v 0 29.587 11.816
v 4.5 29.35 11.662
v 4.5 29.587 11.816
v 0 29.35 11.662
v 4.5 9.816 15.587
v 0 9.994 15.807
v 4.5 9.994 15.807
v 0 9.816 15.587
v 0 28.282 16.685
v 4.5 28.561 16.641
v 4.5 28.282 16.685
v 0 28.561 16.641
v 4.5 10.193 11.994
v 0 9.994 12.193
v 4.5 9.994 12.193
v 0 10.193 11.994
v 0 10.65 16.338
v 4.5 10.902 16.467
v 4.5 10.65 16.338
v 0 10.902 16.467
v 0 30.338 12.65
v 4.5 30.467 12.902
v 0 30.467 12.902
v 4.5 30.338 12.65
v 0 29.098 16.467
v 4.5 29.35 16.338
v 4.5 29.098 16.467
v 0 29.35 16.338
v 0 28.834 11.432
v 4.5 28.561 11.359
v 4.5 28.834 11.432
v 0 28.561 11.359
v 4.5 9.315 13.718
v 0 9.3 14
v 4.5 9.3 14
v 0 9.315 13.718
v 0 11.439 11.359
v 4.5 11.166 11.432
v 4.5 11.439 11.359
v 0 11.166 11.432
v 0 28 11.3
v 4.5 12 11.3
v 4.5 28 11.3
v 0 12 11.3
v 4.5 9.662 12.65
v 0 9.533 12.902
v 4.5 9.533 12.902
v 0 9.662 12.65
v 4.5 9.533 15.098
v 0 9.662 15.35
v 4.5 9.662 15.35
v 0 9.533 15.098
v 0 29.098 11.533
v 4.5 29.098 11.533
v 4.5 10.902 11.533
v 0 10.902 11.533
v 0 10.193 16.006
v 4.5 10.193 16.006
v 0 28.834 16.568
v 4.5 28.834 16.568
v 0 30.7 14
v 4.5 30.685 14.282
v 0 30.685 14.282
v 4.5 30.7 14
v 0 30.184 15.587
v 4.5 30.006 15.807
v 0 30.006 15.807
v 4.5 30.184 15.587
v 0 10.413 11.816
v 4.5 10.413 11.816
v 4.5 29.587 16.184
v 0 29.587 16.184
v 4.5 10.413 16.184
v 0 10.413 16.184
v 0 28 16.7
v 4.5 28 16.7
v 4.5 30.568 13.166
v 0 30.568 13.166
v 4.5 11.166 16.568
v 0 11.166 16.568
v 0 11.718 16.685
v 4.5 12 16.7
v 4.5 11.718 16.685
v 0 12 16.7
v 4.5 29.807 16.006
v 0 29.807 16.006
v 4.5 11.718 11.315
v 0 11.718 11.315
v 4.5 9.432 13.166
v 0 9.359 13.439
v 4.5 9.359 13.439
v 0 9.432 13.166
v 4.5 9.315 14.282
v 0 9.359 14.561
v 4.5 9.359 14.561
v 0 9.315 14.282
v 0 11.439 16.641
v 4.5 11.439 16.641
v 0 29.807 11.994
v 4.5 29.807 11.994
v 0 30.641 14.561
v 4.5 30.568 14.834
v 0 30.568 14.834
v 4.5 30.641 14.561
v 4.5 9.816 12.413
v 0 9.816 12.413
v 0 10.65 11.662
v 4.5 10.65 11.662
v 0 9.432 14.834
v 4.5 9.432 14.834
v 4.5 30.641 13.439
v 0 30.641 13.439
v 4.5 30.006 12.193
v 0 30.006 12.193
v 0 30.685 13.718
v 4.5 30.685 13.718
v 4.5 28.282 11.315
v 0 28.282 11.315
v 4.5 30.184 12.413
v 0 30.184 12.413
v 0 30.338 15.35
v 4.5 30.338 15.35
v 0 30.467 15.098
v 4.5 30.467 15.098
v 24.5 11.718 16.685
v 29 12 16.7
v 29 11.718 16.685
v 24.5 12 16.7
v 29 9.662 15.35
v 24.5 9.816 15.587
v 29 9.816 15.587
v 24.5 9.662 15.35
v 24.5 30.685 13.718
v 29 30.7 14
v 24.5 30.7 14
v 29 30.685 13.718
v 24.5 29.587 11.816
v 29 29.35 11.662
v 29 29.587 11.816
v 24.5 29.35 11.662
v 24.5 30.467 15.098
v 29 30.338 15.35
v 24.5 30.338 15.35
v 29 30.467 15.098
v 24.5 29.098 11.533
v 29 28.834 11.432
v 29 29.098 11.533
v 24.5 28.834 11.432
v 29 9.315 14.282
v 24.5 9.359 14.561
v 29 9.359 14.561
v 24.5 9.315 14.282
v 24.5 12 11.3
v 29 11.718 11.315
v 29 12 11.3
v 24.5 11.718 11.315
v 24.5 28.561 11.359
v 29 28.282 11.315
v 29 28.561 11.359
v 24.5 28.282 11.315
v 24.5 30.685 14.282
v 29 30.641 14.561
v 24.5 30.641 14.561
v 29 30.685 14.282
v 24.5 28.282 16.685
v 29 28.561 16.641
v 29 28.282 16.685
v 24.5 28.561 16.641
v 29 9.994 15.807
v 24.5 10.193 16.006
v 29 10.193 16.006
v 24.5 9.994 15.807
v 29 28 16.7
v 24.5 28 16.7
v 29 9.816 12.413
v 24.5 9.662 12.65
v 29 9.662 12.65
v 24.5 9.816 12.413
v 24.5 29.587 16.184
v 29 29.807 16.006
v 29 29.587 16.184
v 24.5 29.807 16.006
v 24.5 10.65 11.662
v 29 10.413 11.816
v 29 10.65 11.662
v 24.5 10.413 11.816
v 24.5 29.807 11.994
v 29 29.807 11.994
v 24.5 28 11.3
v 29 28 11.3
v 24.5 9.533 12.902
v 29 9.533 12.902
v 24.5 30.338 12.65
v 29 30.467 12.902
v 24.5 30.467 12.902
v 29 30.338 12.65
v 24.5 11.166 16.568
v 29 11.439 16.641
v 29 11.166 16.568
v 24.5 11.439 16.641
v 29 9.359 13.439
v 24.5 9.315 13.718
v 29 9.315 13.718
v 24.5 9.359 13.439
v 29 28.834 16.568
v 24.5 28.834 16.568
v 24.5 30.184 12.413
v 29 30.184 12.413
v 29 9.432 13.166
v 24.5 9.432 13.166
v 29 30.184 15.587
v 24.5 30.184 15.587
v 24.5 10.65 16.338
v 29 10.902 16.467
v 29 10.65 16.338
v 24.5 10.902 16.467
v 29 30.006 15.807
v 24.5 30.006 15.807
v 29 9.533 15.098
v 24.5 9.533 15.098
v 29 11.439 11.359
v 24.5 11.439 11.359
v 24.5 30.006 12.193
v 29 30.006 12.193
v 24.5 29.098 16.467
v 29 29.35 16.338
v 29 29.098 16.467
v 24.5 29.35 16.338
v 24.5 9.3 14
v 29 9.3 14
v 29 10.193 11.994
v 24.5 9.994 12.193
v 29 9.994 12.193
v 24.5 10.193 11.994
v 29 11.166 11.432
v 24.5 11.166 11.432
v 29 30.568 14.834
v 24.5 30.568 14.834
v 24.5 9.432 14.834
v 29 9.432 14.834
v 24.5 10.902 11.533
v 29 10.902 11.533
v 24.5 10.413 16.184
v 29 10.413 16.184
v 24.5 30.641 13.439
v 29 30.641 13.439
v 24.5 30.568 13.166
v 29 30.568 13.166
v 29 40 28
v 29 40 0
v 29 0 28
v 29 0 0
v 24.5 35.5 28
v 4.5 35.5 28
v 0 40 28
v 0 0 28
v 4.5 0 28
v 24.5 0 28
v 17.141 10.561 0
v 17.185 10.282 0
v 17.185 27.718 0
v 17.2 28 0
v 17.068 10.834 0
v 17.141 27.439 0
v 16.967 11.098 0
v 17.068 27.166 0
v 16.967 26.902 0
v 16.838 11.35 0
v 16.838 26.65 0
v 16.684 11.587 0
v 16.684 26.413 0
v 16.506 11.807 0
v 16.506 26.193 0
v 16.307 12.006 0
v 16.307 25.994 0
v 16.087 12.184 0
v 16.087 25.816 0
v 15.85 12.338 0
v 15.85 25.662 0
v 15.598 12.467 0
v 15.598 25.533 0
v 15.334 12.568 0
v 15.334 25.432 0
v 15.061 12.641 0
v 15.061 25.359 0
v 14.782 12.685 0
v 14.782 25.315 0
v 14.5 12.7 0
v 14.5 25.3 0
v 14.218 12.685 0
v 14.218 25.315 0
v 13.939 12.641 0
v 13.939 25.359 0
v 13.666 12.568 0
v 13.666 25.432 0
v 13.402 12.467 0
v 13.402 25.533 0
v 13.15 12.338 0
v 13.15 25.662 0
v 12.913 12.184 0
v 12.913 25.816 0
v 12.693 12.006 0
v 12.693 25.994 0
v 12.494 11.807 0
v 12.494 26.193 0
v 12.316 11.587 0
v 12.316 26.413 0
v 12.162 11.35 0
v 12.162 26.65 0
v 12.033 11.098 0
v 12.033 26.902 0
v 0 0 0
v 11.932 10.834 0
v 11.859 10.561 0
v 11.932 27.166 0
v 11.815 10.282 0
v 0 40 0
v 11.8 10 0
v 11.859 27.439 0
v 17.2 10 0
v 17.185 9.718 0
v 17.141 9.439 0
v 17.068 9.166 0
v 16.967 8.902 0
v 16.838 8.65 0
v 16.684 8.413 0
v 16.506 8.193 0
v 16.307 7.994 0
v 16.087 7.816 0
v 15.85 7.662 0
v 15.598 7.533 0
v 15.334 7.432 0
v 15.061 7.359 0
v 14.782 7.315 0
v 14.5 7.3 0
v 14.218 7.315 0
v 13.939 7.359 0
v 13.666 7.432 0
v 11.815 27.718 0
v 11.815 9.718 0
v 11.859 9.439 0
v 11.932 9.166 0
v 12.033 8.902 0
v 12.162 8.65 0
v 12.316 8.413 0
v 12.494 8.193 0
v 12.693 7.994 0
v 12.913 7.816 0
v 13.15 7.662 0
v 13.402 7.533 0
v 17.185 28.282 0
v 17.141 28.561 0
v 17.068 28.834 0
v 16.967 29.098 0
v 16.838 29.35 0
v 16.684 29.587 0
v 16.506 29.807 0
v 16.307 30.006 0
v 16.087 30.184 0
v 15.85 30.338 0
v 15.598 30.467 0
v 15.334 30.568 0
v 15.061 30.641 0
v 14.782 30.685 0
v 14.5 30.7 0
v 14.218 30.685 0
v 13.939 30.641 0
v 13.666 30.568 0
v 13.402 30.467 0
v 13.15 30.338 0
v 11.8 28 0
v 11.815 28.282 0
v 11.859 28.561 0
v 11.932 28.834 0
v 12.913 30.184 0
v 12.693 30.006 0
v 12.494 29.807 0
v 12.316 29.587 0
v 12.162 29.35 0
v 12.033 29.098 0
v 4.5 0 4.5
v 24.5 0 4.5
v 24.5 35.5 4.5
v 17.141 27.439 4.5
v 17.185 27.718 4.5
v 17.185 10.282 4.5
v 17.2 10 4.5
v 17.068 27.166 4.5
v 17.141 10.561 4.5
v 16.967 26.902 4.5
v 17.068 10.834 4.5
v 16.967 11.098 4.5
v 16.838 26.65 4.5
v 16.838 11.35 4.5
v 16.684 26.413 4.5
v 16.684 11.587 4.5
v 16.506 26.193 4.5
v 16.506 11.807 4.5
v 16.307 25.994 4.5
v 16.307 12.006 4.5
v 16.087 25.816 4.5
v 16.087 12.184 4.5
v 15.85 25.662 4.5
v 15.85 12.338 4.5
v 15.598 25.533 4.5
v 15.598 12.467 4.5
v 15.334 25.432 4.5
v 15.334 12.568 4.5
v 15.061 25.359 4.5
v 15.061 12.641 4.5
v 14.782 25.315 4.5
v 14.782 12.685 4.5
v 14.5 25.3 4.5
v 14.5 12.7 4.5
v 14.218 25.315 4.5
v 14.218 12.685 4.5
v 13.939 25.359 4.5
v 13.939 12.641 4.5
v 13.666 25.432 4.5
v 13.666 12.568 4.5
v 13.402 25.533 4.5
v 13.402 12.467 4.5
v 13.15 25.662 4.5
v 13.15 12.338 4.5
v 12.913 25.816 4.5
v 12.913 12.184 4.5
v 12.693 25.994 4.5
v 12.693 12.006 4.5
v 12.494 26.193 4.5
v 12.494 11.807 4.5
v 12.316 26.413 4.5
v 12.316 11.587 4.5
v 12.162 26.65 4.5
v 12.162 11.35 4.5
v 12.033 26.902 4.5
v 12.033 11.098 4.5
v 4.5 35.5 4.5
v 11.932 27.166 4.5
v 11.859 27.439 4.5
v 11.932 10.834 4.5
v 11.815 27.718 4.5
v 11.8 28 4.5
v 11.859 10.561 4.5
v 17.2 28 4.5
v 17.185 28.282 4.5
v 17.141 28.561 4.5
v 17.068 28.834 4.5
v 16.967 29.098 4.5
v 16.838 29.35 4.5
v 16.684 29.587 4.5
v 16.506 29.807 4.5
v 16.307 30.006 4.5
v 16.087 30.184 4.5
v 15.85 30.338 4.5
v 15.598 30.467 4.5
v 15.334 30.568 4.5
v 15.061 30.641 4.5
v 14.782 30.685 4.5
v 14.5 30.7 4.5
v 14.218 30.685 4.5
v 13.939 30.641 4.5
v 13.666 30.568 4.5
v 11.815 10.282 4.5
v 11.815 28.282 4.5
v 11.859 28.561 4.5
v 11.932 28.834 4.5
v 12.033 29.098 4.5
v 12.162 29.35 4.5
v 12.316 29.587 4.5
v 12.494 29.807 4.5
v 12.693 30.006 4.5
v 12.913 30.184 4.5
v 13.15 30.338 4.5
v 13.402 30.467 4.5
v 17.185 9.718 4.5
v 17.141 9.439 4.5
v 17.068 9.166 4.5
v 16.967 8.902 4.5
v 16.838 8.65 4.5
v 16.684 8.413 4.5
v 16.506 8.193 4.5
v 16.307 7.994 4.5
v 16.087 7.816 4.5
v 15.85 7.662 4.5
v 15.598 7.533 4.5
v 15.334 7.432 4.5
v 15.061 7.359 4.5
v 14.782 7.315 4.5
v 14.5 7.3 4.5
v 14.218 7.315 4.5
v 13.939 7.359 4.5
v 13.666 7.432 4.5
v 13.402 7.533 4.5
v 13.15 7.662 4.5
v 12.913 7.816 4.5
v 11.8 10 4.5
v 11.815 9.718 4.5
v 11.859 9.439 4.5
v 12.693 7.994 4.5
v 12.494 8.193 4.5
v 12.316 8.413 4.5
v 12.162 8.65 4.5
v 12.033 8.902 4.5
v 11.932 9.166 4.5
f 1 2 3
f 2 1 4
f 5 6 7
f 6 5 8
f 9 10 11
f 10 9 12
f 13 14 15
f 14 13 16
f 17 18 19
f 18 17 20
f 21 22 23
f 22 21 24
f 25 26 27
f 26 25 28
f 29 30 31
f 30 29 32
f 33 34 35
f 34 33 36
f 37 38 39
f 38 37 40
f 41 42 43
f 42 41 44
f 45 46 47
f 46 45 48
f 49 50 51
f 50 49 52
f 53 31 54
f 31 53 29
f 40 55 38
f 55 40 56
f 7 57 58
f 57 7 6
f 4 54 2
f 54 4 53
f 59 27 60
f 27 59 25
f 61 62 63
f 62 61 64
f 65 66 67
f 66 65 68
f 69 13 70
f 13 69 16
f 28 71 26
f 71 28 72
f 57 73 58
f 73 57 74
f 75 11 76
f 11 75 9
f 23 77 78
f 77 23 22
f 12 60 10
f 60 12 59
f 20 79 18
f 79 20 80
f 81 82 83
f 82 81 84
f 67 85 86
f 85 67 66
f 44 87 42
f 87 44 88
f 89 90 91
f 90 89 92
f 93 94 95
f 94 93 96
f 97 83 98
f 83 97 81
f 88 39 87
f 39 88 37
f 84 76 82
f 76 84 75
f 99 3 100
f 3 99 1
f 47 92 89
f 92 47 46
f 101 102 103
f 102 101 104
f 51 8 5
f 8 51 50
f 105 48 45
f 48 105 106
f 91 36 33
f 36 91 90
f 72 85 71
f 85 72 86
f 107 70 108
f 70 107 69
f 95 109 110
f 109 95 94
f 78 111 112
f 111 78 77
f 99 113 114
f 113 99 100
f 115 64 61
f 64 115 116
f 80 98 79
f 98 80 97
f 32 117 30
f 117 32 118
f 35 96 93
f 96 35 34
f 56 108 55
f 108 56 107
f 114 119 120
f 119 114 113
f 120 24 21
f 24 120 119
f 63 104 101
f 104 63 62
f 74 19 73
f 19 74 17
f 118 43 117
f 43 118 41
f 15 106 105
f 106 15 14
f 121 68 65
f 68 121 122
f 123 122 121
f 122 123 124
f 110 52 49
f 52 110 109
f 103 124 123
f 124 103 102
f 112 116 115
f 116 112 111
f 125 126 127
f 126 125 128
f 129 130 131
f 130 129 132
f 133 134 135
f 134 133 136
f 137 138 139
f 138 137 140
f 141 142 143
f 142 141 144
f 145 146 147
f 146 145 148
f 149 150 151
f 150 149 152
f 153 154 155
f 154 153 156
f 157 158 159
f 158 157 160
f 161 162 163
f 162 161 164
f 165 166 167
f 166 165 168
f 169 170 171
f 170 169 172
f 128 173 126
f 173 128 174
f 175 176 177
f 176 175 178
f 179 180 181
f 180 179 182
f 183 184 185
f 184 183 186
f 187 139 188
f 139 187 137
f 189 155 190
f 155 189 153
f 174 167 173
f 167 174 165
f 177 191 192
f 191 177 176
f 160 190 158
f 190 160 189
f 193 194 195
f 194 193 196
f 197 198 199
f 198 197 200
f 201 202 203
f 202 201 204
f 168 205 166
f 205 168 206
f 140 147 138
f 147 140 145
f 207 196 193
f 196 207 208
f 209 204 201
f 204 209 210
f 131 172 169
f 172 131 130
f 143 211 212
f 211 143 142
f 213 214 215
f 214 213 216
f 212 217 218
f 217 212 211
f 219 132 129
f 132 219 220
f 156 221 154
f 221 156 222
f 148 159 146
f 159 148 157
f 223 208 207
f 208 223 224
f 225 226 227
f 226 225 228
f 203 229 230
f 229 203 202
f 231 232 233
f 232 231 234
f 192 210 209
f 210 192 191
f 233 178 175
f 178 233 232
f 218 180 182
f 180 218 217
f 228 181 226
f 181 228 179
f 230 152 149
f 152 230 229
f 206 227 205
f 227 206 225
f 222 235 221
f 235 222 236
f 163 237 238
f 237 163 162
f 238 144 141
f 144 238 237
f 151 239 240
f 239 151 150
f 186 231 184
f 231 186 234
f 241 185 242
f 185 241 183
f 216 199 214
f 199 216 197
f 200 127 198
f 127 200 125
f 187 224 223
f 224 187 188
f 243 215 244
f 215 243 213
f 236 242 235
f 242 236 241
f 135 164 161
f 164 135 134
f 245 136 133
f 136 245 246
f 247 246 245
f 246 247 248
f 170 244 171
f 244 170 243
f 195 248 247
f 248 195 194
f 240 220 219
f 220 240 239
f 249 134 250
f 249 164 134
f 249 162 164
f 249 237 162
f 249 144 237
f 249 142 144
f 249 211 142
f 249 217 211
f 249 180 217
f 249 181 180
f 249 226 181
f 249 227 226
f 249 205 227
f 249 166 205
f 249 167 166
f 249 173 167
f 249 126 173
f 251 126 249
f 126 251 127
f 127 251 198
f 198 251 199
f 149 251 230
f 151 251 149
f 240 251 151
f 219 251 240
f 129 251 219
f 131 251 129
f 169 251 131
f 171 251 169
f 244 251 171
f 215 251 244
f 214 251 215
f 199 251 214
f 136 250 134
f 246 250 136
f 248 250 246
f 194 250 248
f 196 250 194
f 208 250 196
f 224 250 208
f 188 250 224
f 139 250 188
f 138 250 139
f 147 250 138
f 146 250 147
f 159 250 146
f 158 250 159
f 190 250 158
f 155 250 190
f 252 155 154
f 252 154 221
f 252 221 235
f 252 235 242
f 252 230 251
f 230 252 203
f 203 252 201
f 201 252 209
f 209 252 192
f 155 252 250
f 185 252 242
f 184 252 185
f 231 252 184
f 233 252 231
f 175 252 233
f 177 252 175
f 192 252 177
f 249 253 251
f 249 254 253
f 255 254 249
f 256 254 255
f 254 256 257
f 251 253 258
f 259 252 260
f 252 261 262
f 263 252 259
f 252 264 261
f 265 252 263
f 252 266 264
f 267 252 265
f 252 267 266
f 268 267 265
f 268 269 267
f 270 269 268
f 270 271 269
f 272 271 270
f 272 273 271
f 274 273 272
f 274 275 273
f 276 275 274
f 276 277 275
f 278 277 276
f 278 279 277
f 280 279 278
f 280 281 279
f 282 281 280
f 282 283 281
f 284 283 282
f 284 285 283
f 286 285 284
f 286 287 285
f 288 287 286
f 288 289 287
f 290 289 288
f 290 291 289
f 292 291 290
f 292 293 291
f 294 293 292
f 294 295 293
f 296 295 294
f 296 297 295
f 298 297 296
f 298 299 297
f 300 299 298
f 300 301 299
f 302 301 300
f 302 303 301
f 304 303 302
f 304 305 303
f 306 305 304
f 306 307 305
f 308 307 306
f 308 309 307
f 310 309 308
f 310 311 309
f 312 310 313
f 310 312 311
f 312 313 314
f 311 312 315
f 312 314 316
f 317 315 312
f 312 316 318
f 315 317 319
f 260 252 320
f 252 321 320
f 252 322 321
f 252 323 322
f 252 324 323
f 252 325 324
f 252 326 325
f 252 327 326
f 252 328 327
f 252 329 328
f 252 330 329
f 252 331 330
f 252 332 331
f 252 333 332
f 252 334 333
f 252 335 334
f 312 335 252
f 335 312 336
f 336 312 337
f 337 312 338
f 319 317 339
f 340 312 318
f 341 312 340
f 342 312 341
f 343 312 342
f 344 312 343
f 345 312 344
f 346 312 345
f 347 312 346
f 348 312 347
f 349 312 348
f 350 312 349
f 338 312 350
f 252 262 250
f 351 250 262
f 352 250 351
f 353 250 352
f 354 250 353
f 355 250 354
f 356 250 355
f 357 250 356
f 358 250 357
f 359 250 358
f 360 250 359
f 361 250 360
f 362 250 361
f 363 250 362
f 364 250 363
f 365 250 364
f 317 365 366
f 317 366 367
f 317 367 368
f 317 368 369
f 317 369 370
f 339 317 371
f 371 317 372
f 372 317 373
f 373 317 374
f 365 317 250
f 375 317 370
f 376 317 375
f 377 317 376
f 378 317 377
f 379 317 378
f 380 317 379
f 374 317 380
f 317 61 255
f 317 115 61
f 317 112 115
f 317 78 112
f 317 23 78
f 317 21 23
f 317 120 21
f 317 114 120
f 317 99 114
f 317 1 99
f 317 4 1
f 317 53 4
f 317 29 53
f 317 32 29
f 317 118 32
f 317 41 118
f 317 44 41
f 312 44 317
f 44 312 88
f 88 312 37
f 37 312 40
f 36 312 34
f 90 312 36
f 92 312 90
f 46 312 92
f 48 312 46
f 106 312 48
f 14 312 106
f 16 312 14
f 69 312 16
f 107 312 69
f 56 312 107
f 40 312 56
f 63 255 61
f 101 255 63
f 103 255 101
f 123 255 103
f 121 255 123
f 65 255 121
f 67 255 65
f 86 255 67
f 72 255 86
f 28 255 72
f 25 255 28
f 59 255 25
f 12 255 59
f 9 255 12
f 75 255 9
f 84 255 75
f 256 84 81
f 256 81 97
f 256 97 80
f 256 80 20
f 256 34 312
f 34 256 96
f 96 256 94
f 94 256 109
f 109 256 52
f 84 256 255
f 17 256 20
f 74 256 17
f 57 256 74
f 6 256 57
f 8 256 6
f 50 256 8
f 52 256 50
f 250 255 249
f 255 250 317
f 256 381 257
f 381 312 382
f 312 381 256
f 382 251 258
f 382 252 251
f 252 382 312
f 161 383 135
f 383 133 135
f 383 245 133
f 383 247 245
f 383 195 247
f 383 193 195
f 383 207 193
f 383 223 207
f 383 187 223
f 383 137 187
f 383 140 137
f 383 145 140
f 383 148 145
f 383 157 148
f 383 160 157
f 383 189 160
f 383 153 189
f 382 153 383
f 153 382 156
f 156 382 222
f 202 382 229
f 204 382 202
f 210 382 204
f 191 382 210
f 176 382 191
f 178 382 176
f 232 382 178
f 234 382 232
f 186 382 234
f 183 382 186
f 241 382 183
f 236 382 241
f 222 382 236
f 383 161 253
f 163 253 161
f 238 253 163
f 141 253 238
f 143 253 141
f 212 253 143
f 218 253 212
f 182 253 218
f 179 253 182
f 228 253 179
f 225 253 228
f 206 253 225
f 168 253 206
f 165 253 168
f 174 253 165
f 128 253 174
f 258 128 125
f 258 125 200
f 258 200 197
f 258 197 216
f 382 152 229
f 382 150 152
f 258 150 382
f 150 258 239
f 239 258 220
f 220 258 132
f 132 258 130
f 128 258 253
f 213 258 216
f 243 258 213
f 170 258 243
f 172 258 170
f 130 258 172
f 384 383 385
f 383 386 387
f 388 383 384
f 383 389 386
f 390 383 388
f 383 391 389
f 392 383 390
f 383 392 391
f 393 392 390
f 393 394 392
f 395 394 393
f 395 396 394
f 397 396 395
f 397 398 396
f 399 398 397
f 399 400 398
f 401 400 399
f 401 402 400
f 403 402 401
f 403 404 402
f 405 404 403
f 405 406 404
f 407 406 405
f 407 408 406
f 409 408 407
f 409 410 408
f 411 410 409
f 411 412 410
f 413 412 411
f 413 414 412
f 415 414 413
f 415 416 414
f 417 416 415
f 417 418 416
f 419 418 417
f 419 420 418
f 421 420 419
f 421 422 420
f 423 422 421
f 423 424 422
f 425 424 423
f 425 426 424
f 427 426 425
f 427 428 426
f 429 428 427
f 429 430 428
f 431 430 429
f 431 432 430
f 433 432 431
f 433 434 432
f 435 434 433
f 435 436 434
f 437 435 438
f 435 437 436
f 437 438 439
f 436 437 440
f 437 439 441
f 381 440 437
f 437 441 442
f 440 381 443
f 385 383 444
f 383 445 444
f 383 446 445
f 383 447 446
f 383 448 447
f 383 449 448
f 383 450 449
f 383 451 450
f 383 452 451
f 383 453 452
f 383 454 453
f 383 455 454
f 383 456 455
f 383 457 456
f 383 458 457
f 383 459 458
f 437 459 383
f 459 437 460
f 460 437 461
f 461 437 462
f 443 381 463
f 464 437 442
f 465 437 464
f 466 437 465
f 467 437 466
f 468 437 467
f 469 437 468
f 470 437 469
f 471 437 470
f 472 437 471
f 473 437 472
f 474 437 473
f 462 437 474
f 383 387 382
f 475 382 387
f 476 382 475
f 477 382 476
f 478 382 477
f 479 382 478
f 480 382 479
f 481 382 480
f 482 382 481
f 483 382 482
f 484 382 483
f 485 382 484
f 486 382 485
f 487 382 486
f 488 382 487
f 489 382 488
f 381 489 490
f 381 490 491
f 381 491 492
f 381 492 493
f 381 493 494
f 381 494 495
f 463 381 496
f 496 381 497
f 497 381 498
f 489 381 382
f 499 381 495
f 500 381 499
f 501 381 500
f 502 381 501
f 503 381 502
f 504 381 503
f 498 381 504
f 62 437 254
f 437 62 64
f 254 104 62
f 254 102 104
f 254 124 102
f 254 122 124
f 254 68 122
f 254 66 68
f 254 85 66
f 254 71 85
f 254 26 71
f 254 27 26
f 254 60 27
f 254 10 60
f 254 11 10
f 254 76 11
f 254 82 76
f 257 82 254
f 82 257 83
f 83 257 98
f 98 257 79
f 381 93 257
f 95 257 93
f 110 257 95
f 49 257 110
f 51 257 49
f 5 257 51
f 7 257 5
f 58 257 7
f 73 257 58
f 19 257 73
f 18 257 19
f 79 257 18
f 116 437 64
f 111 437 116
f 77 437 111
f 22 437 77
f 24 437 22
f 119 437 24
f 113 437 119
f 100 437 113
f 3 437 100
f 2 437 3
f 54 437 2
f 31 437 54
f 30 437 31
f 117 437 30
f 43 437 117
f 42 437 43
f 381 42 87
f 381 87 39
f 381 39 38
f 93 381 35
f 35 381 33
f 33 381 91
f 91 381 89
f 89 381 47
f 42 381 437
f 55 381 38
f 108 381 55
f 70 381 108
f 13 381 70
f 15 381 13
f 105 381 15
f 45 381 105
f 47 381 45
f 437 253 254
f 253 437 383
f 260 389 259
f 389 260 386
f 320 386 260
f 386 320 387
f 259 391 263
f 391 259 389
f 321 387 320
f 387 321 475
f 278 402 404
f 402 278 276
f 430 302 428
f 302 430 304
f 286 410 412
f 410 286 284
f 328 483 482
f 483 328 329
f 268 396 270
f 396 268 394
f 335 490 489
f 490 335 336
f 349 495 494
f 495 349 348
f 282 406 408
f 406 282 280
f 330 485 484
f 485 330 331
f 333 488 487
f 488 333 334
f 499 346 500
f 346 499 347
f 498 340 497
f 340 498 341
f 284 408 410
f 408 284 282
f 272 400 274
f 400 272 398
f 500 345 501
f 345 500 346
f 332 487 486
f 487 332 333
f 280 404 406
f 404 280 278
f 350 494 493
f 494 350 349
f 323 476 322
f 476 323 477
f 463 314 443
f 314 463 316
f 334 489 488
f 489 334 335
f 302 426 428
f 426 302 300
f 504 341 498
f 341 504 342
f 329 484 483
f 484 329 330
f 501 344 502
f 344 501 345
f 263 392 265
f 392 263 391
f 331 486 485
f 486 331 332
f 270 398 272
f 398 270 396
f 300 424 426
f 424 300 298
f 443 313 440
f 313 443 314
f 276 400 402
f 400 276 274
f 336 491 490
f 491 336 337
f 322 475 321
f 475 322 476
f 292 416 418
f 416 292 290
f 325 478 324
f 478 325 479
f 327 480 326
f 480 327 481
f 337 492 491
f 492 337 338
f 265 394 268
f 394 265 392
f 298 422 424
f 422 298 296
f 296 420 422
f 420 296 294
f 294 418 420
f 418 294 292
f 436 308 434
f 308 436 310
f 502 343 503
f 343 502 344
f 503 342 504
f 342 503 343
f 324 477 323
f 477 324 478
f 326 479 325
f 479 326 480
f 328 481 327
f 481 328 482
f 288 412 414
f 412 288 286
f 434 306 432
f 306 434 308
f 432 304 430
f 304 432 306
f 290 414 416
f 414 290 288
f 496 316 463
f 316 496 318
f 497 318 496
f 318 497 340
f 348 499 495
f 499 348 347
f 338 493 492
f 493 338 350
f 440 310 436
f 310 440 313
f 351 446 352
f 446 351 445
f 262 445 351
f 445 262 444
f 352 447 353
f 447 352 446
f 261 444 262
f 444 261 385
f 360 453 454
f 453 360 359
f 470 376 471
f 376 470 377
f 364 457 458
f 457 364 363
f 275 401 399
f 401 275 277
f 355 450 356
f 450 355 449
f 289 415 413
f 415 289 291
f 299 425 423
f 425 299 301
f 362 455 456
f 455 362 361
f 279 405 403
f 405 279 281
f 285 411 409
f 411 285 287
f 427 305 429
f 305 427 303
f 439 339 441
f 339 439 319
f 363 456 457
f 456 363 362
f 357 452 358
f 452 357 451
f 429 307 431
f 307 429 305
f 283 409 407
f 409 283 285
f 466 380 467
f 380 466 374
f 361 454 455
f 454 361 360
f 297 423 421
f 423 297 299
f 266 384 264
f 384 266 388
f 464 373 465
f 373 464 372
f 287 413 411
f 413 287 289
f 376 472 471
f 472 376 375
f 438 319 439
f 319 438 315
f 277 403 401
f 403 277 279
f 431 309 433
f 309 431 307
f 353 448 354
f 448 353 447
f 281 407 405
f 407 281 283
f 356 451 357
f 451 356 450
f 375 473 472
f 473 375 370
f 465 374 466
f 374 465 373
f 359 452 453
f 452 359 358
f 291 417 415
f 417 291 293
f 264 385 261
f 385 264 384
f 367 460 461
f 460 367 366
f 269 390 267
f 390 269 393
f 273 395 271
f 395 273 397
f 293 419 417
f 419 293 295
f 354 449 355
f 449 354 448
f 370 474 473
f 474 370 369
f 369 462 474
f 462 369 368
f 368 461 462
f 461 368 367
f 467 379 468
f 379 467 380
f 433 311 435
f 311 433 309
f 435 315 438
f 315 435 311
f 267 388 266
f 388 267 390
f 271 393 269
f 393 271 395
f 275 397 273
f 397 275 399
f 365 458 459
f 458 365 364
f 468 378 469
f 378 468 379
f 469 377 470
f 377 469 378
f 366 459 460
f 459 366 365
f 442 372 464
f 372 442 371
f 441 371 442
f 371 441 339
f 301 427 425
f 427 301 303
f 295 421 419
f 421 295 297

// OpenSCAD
// ==============================================================================
// TFG: BANCO MECATRÓNICO DE MICROGRAVEDAD SIMULADA
// Componente: Soporte Tensor para Polea Loca (Idler GT2) en Perfil 2020
// Aplicación: Extremo de retorno y tensado de la correa del Carro Transversal
// Diseñado para: Fabricación Aditiva FDM (PLA/PETG/ABS)
// ==============================================================================

$fn = 60;

// Parámetros de la polea y perfil
profile_width    = 20.0;
wall_thick       = 4.5;
idler_slot_len   = 16.0;  // Longitud de corredera para regular la tensión de la correa
m5_pass_dia      = 5.4;   // Para eje de la polea loca GT2 (5 mm)
m5_mount_dia     = 5.4;   // Para fijación a ranura de perfil 2020 con tuerca T
body_length      = 40.0;
body_height      = 28.0;
pulley_gap       = 12.0;  // Hueco para alojar la polea GT2 con rodamientos

module soporte_tensor_idler() {
    difference() {
        // Bloque en forma de U / horquilla
        cube([profile_width + 2 * wall_thick, body_length, body_height]);

        // Vaciado central para la polea loca y el paso de la correa
        translate([wall_thick, -1, wall_thick])
            cube([profile_width, body_length - wall_thick + 1, body_height]);

        // Ranuras de corredera lateral para el eje M5 de la polea tensora
        for (side = [-1, 1]) {
            translate([side > 0 ? profile_width + wall_thick - 1 : -1, body_length/2 - idler_slot_len/2, body_height/2]) {
                rotate([0, 90, 0]) {
                    hull() {
                        cylinder(d = m5_pass_dia, h = wall_thick + 2);
                        translate([0, idler_slot_len, 0])
                            cylinder(d = m5_pass_dia, h = wall_thick + 2);
                    }
                }
            }
        }

        // Taladros M5 en la base inferior para fijar rígidamente al perfil 2020
        translate([(profile_width + 2*wall_thick)/2, 10.0, -1])
            cylinder(d = m5_mount_dia, h = wall_thick + 2);
            
        translate([(profile_width + 2*wall_thick)/2, 28.0, -1])
            cylinder(d = m5_mount_dia, h = wall_thick + 2);
    }
}

soporte_tensor_idler();
